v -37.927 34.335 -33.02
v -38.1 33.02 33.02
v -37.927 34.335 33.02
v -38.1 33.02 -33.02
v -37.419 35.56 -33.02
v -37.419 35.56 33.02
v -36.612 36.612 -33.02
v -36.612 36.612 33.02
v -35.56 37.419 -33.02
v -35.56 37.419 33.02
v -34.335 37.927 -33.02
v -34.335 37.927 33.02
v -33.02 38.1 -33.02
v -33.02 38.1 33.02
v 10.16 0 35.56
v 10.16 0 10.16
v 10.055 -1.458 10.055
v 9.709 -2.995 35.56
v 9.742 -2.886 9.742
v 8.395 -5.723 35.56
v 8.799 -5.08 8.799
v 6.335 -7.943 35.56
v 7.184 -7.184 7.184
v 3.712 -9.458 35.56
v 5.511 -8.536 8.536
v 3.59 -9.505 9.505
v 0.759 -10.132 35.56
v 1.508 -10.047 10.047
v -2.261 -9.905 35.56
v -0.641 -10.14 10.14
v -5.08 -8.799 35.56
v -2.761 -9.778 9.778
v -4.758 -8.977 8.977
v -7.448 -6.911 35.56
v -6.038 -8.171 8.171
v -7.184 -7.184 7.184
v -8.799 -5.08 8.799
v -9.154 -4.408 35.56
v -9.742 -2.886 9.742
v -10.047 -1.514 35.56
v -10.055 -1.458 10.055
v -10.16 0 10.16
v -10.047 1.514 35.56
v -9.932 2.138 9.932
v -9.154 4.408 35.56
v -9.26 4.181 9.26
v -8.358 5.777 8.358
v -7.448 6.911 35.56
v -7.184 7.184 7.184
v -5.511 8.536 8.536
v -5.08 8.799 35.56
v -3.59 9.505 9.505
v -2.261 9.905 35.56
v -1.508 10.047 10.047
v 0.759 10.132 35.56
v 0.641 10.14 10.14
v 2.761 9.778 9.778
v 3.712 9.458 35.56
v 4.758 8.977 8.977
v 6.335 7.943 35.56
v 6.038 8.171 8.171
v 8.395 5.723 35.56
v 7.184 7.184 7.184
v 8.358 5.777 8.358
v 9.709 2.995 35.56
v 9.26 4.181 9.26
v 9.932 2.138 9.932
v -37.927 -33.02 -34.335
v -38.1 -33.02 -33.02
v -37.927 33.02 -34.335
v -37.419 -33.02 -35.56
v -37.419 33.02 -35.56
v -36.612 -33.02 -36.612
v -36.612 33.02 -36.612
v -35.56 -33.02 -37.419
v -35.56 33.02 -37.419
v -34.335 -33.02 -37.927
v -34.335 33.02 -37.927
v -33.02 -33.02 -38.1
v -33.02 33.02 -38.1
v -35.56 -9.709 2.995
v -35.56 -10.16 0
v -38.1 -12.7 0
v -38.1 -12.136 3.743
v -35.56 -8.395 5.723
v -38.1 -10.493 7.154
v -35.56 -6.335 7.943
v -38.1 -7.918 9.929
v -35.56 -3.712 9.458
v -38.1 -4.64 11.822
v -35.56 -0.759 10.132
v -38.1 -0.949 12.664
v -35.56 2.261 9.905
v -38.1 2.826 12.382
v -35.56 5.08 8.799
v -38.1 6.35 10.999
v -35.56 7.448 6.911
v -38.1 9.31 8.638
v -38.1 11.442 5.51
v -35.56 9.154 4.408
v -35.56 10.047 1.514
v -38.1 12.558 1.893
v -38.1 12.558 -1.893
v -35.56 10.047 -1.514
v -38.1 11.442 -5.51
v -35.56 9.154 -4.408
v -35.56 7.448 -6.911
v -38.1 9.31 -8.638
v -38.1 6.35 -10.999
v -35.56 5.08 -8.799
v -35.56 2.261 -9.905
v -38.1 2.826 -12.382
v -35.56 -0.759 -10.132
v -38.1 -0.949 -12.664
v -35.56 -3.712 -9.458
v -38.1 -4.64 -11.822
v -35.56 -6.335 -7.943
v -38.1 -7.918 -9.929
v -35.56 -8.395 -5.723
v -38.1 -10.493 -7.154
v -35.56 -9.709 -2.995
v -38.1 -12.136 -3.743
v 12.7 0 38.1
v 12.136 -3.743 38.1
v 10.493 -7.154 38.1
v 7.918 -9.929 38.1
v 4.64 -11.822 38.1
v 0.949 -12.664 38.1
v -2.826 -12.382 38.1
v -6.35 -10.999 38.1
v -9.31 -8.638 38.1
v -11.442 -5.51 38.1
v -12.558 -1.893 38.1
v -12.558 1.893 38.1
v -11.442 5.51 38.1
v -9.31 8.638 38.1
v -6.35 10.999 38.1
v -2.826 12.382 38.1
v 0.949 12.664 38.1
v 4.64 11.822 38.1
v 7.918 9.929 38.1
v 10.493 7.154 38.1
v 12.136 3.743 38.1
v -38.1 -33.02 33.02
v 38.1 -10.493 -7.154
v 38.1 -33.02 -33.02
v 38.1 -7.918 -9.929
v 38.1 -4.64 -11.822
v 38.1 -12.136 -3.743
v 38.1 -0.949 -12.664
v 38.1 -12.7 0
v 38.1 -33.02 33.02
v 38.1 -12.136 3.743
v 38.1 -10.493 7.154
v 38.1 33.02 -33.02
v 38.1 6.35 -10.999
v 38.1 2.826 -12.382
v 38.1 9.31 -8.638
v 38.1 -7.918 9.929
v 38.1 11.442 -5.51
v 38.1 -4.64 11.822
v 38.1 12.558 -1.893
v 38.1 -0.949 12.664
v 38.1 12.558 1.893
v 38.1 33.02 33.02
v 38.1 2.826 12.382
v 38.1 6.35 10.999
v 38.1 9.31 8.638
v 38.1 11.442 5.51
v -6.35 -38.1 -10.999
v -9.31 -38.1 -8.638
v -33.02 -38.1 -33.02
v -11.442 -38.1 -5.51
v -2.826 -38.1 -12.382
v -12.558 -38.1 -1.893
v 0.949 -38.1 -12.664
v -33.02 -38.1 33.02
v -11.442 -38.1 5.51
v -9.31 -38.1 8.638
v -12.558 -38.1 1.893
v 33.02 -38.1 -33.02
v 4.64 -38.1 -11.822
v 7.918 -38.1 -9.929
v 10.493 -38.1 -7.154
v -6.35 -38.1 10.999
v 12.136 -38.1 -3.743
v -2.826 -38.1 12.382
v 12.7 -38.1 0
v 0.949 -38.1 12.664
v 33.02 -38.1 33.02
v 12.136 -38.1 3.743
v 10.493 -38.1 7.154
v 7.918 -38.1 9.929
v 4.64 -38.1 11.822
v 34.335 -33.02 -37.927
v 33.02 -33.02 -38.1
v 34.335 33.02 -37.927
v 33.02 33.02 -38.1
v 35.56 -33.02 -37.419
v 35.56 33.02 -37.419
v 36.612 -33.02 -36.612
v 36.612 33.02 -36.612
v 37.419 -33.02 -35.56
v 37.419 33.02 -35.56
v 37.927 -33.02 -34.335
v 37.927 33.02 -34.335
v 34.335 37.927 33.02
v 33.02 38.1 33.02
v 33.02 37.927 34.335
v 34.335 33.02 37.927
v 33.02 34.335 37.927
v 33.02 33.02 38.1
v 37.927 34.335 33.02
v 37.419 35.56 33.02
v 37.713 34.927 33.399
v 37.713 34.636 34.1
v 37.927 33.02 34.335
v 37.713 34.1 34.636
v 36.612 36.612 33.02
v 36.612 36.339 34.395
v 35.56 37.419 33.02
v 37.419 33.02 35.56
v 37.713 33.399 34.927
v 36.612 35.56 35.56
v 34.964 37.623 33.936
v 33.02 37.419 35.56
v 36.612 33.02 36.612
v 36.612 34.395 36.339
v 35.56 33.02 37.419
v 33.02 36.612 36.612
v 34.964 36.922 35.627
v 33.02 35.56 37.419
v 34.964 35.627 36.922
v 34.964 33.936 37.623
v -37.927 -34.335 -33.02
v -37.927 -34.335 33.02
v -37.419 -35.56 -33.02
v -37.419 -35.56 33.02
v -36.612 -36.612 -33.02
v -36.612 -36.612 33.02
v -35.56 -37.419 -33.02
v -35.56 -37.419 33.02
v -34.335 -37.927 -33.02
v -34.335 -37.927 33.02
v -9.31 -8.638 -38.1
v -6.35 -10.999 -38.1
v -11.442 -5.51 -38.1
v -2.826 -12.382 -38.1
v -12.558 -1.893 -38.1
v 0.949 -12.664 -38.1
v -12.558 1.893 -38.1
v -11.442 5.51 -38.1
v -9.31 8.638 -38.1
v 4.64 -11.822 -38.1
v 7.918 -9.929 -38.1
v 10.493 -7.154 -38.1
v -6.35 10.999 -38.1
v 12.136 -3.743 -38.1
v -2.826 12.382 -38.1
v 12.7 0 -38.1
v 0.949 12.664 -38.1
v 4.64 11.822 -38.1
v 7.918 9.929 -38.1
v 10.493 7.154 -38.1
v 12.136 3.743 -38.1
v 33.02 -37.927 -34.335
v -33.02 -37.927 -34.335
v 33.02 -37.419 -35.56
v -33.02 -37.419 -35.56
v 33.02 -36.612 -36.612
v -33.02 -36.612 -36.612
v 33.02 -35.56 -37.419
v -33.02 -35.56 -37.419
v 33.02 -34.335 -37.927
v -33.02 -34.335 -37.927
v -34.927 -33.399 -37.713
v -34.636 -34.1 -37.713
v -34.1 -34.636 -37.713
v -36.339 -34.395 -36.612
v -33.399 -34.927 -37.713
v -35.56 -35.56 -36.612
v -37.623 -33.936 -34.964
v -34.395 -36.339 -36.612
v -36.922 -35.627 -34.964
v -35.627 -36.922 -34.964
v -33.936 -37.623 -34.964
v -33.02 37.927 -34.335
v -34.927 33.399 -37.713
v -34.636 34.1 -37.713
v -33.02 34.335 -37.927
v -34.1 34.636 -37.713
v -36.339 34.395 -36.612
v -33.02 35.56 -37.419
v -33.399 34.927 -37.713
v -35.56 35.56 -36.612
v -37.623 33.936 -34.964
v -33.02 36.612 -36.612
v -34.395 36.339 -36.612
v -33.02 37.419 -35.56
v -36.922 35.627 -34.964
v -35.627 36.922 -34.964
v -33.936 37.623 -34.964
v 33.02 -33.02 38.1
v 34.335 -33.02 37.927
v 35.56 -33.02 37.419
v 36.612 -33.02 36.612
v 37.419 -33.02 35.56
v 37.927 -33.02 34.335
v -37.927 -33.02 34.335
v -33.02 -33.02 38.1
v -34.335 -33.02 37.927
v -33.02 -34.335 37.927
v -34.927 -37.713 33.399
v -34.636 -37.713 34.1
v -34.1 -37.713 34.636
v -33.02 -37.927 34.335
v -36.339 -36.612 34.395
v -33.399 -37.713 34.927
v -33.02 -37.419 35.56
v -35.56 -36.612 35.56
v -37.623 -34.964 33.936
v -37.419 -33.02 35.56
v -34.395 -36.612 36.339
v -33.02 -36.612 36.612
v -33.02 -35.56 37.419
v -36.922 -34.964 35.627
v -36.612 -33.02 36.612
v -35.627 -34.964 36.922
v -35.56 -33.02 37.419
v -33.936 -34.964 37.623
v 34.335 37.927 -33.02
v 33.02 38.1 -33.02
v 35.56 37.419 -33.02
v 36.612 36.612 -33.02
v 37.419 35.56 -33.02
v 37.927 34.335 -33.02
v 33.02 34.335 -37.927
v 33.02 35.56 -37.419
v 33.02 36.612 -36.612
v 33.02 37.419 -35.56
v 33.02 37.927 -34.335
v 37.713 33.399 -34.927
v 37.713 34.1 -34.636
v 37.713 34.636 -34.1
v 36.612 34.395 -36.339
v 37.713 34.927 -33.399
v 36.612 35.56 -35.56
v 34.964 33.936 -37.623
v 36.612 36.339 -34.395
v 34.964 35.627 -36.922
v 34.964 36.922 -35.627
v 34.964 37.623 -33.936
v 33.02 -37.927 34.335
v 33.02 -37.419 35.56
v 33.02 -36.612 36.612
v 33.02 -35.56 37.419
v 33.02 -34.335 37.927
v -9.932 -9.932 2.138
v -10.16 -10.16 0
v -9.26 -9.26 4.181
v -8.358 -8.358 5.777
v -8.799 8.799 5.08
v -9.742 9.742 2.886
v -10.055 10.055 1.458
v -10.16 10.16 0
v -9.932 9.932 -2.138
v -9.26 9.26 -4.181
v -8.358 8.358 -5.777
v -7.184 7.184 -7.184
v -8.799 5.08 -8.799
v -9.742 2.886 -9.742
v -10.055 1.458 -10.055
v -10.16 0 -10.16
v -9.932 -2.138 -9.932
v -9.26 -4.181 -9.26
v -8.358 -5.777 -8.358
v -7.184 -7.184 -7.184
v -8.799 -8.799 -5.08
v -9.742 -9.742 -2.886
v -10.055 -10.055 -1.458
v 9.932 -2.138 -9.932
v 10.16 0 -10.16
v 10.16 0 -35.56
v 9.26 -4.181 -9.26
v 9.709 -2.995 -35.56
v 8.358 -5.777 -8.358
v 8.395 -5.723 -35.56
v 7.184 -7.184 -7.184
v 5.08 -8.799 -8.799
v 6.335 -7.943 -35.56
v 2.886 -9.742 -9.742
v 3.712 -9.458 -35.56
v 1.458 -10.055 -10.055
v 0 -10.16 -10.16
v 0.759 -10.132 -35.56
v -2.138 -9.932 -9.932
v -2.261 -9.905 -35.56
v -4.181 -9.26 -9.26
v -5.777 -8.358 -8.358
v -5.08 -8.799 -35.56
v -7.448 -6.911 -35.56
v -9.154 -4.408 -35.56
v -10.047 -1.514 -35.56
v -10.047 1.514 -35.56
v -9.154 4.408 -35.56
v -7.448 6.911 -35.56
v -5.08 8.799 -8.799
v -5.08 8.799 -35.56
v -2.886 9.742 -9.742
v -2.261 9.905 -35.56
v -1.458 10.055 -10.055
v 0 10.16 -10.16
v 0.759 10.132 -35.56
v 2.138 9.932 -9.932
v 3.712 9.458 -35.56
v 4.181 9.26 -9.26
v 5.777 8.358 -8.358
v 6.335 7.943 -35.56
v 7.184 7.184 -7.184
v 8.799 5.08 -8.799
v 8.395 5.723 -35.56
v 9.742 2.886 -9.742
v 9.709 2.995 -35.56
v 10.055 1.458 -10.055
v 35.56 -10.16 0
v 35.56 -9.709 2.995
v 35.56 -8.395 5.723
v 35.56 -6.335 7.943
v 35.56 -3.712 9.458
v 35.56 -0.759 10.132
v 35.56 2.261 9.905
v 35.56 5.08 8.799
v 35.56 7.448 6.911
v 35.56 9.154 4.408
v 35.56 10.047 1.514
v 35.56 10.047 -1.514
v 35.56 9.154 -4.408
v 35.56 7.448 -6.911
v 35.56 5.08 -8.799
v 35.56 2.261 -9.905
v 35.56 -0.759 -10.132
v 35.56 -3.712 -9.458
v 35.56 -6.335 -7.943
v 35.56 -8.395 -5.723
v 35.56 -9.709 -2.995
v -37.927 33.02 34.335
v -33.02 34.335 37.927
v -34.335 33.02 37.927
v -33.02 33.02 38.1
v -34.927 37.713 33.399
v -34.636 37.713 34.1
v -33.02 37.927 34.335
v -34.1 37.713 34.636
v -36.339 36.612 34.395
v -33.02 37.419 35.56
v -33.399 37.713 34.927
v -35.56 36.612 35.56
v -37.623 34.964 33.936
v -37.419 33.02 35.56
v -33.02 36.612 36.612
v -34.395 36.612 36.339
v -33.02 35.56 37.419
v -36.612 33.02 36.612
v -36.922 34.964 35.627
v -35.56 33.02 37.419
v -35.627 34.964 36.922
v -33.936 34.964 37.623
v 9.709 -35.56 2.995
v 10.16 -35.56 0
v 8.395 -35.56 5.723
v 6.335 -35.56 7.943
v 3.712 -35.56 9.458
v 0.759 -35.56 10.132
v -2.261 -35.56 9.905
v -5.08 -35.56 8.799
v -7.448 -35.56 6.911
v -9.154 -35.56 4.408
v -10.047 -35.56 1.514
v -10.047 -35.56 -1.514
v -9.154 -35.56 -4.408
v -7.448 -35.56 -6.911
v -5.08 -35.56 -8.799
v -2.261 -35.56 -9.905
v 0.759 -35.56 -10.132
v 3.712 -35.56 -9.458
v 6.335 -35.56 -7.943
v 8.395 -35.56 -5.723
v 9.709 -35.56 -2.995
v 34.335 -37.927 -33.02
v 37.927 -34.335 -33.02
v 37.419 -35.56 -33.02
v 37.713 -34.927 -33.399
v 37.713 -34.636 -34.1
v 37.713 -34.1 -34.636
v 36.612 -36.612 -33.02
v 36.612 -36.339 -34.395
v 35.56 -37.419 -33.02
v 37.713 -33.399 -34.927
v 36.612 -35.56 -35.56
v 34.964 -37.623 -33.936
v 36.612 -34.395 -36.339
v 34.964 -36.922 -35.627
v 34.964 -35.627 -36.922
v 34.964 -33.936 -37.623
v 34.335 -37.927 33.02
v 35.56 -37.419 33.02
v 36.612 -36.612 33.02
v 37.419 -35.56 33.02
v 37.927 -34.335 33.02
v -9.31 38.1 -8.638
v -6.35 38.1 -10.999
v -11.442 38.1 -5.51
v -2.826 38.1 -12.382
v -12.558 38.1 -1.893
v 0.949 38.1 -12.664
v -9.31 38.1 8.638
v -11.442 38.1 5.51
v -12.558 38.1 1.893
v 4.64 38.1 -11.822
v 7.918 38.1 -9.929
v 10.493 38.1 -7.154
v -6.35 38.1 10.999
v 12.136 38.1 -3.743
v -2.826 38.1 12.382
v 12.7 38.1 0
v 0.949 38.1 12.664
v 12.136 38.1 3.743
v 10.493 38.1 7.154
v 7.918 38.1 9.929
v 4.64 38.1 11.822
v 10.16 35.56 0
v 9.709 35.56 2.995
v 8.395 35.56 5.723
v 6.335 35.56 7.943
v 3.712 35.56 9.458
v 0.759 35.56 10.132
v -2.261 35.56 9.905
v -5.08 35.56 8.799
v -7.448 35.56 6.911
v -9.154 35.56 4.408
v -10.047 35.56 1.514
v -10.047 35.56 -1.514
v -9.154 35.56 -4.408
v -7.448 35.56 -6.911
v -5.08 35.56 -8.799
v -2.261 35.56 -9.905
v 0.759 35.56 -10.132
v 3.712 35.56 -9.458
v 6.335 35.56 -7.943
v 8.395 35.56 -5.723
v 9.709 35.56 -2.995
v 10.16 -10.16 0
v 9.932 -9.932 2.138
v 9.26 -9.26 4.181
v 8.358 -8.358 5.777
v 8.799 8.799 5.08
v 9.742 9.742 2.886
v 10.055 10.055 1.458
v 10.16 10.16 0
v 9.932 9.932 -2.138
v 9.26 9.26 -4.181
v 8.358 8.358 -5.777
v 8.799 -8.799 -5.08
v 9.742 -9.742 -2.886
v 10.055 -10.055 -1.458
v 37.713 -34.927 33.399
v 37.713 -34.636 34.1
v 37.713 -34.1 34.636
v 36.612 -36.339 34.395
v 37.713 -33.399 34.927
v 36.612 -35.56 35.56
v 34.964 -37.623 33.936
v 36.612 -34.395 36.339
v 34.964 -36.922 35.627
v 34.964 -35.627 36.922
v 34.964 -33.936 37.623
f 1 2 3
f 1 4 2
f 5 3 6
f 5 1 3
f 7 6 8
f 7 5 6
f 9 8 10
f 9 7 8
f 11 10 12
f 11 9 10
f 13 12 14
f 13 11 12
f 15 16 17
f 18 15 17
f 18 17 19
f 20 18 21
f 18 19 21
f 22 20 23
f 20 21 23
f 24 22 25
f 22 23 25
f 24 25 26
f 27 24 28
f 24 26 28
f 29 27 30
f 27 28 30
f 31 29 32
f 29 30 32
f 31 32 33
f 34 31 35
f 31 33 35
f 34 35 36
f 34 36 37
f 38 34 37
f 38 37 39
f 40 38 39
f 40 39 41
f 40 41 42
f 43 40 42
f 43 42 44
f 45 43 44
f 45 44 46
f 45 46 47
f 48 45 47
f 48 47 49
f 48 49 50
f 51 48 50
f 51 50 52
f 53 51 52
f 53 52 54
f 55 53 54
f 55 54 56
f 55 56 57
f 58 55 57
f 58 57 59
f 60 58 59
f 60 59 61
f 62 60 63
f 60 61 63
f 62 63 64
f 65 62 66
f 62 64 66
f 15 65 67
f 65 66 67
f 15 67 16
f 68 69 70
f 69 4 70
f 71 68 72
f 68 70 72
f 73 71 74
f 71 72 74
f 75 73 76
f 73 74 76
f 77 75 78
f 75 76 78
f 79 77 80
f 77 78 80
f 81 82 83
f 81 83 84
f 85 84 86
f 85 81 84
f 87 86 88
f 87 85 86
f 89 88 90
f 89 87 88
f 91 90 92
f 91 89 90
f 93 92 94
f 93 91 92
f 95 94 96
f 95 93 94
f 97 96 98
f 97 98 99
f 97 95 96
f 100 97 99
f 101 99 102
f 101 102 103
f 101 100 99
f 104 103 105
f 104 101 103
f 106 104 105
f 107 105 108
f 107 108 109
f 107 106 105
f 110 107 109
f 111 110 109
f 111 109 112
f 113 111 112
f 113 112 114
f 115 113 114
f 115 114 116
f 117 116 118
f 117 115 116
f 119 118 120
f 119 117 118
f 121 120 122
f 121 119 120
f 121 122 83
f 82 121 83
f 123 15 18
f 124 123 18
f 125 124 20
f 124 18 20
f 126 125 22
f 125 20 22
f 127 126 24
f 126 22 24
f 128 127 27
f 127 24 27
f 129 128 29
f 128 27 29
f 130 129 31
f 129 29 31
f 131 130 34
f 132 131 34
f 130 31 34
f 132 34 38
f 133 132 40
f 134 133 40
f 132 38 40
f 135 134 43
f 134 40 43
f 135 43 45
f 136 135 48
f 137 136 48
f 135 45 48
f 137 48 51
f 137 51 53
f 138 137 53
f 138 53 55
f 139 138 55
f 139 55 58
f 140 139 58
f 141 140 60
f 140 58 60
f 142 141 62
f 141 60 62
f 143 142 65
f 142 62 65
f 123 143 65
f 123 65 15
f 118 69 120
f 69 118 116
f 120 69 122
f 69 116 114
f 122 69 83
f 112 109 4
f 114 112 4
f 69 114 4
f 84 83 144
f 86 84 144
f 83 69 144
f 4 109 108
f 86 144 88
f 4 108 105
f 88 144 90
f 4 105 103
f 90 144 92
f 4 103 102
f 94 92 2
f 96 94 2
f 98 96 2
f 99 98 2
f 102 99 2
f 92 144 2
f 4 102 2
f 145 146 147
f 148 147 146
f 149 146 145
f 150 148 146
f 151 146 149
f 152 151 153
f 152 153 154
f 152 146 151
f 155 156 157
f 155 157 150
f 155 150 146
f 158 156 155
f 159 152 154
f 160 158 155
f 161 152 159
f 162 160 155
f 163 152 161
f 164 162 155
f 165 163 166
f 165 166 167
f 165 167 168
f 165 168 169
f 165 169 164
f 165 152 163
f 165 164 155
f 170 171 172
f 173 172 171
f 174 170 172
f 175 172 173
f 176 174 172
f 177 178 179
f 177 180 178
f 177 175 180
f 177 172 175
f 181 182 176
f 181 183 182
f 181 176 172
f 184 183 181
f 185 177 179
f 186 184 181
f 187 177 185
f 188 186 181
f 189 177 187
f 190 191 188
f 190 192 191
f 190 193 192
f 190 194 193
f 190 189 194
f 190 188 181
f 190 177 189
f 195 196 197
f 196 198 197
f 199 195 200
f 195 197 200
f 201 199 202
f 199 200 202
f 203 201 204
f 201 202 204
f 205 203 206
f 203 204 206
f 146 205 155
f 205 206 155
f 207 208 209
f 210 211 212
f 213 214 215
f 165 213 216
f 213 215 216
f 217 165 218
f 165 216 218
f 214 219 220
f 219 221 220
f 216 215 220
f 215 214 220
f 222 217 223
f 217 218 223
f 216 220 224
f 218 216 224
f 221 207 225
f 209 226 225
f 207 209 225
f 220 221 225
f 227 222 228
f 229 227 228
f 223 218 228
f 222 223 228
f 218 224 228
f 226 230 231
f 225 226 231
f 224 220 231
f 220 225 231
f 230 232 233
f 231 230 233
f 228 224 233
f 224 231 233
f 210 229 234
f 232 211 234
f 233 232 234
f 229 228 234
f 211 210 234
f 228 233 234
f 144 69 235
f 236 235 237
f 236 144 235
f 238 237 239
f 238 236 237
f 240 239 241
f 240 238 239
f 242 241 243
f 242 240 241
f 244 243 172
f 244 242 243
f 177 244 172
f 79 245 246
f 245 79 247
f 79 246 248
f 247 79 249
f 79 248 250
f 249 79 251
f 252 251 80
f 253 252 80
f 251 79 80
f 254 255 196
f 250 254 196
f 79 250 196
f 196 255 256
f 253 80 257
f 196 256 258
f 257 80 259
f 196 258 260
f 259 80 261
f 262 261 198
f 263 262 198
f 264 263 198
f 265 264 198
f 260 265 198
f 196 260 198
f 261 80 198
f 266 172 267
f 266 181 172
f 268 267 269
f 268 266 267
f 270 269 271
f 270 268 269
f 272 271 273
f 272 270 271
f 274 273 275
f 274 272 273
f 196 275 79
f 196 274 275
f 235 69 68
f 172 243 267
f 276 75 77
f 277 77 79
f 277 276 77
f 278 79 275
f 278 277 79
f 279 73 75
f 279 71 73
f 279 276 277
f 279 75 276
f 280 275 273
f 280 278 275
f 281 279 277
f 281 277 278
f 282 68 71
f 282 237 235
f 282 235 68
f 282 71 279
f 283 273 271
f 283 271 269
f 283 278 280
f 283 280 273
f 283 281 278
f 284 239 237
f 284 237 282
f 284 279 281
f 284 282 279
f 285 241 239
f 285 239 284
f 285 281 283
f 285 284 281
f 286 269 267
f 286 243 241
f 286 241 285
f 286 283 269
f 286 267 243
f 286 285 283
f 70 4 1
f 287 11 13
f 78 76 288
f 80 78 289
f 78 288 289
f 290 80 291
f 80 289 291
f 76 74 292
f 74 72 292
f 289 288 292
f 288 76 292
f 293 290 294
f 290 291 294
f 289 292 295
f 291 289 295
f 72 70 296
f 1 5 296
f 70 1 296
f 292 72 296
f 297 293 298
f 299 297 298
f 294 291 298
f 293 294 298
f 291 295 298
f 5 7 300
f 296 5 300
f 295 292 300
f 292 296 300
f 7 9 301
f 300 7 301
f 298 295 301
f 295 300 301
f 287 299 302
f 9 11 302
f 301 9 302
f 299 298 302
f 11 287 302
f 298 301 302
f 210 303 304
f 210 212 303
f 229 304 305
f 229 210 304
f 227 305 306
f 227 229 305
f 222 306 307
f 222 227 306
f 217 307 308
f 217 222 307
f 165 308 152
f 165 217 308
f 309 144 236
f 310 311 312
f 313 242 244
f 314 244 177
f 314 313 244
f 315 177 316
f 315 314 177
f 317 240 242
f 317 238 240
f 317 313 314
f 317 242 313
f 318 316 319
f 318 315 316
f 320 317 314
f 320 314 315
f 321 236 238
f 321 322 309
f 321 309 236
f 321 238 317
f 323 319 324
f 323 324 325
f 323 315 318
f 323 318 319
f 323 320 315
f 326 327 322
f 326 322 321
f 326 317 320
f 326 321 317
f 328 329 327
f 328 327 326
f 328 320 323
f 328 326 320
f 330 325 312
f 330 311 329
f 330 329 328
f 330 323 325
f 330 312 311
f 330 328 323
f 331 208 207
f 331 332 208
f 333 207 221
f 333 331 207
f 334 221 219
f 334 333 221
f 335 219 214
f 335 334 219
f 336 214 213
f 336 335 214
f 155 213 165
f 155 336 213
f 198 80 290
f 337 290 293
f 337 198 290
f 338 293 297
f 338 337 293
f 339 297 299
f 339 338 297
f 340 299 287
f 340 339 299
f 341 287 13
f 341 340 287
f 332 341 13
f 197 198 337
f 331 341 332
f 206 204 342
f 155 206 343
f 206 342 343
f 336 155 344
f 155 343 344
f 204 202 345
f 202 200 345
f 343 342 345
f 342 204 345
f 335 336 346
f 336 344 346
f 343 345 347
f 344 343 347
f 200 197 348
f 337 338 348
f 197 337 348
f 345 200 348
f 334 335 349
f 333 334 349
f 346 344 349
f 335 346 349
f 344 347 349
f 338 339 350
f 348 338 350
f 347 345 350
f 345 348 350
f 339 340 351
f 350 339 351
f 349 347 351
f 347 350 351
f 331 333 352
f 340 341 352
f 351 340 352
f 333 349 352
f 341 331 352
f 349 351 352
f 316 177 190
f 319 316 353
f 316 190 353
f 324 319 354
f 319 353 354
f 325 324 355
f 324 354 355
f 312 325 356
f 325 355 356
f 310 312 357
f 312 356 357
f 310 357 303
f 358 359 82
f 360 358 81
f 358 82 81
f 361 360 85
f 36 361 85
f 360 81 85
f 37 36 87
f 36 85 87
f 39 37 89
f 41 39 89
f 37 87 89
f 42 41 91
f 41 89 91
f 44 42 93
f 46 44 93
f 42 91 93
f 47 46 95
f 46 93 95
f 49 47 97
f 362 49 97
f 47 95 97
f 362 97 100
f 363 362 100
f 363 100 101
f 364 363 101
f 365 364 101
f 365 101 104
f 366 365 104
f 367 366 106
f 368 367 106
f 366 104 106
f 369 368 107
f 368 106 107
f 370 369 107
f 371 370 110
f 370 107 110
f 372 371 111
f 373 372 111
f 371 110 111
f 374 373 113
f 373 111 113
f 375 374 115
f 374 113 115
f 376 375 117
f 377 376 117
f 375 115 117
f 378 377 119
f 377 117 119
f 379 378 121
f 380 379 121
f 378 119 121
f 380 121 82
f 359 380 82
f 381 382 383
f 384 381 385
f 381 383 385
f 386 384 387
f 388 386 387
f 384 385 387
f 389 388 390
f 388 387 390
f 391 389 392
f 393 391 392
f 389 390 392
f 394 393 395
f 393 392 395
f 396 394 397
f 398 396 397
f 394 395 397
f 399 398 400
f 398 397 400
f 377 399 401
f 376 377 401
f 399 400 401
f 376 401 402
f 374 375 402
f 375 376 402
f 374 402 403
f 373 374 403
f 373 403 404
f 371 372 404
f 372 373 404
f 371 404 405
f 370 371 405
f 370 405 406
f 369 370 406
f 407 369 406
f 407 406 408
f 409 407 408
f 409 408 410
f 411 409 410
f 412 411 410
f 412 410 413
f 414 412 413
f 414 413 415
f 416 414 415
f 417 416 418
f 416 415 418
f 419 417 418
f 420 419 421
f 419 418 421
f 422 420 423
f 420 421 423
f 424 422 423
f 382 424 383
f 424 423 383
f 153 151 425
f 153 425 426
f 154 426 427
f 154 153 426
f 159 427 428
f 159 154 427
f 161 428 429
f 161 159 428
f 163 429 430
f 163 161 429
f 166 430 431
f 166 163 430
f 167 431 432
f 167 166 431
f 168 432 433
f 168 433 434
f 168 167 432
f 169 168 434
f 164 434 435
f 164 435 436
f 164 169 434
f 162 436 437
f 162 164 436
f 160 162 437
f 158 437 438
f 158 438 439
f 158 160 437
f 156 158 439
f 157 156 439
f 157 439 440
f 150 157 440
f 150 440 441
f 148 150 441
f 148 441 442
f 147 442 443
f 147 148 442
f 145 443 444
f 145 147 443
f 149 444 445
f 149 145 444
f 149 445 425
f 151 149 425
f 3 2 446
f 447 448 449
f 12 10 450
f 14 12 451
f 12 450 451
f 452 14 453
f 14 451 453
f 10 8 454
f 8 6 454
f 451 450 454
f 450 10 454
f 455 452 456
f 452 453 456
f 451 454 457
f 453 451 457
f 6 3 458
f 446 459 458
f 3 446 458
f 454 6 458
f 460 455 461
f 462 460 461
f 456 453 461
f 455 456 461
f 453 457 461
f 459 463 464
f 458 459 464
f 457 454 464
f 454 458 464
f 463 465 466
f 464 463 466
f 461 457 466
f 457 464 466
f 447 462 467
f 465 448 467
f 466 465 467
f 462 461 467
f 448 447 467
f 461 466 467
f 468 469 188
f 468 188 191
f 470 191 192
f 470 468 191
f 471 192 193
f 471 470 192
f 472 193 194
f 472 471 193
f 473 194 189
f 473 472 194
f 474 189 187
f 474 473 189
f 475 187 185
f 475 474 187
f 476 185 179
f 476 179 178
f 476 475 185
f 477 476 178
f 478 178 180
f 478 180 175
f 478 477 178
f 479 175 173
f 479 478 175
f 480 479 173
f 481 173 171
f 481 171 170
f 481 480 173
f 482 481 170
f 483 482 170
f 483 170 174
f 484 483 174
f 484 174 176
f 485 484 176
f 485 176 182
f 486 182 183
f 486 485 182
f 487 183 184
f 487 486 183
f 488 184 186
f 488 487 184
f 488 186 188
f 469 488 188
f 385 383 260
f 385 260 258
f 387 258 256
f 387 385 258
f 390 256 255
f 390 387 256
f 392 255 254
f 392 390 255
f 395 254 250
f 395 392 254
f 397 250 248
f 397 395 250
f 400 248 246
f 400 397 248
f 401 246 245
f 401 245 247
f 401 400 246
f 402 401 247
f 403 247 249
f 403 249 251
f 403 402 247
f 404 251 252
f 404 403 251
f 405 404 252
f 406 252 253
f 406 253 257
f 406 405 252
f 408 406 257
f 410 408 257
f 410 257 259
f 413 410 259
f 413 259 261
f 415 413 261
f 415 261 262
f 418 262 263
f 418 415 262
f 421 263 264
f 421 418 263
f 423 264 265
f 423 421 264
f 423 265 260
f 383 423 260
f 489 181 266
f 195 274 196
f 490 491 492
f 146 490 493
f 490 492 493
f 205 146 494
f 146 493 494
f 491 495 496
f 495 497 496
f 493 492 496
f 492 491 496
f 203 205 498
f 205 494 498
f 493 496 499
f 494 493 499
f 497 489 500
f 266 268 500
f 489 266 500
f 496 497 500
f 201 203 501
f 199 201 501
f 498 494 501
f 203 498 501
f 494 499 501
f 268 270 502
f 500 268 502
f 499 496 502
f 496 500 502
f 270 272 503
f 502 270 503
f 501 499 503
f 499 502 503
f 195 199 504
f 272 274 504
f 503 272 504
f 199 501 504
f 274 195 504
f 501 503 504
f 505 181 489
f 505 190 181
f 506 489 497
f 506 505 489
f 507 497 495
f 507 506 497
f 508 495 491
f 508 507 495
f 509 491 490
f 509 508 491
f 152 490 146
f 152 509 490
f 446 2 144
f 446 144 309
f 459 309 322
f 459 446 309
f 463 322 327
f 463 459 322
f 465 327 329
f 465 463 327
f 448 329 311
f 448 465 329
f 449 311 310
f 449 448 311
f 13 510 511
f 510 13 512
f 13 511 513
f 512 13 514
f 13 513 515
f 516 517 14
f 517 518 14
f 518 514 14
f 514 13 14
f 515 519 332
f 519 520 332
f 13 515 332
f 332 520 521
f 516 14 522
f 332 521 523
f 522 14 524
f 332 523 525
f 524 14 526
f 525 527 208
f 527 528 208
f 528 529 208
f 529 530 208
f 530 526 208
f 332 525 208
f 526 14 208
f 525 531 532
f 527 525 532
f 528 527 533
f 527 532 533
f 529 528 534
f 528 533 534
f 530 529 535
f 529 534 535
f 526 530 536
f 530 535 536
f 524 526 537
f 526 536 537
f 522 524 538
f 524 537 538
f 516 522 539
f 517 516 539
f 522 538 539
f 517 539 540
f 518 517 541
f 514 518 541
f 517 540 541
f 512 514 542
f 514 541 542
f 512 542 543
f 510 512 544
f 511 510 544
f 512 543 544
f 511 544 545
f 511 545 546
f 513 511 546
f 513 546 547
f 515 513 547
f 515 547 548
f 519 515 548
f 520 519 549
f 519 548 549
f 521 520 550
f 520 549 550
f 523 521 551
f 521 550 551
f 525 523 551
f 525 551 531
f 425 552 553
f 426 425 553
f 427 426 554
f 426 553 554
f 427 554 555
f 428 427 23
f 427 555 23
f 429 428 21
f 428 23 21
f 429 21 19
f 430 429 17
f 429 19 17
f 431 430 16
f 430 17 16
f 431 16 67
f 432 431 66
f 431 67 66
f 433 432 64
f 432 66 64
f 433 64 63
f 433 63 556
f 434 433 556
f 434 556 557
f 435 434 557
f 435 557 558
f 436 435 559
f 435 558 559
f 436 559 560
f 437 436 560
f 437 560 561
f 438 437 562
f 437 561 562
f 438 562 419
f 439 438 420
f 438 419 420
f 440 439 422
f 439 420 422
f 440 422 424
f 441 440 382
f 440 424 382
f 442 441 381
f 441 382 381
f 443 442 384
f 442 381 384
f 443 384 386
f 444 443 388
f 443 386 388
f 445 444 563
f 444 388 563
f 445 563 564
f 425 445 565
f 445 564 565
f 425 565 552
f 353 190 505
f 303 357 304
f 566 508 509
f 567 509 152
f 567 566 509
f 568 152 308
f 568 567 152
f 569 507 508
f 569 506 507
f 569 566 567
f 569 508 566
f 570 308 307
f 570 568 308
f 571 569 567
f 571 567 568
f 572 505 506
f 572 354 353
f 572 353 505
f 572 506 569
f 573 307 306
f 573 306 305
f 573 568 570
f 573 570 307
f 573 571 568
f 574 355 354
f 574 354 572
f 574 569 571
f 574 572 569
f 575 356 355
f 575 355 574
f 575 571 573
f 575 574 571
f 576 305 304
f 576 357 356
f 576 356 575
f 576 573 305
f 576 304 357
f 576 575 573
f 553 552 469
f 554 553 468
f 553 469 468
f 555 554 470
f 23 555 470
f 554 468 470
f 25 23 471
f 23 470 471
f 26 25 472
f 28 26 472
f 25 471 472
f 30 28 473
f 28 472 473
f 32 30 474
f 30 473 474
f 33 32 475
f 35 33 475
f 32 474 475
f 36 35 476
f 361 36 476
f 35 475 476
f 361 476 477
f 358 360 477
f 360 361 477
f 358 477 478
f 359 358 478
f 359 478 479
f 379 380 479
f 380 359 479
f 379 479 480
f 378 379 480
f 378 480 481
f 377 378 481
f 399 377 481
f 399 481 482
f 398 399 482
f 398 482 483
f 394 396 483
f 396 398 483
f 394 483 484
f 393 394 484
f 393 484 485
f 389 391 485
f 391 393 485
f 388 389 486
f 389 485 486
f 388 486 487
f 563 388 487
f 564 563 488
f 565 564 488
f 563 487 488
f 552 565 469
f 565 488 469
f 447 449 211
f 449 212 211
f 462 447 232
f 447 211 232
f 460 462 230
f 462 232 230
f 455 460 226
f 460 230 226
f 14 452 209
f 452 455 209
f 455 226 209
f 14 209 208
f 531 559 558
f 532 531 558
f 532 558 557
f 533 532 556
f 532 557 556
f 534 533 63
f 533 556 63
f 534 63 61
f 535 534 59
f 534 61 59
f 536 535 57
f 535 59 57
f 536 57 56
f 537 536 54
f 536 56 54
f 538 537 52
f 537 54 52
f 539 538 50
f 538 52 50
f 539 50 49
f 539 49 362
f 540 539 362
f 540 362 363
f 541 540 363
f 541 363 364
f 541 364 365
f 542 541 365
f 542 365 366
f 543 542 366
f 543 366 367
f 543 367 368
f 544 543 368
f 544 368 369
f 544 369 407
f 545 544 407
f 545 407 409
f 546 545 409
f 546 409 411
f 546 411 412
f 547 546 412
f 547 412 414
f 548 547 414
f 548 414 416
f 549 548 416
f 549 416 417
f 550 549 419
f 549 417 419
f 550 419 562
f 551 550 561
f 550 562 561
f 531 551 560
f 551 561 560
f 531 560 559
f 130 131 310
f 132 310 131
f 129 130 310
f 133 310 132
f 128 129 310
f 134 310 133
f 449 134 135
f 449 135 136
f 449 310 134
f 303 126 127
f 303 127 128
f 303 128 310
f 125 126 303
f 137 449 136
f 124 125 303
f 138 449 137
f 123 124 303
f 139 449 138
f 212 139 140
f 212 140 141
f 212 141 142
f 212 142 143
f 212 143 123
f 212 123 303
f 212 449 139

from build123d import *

# Parameters (mm, degrees)
F0_W     = 76.2
F0_H     = 76.2
F1_DEPTH = 38.1
F2_R     = 10.16
F3_DEPTH = 147.32
F4_R     = 10.16
F5_DEPTH = 163.322
F6_R     = 10.16
F7_DEPTH = 99.06
F8_R     = 5.08
F9_SIZE  = 2.54


with BuildPart() as f1:
    # F0 (on Top) → F1 (new body, symmetric)
    with BuildSketch(Plane.XY):
        Rectangle(F0_W, F0_H)
    extrude(amount=F1_DEPTH, both=True)

    # F2 (on face) → F3 (cut, symmetric)
    with BuildSketch(Plane(origin=(-38.1, 0, 0), x_dir=(0, -1, 0), z_dir=(-1, 0, 0))):
        Circle(F2_R)
    extrude(amount=F3_DEPTH, both=True, mode=Mode.SUBTRACT)

    # F4 (on face) → F5 (cut)
    with BuildSketch(Plane(origin=(0, 0, -38.1), x_dir=(1, 0, 0), z_dir=(0, 0, -1))):
        Circle(F4_R)
    extrude(amount=-F5_DEPTH, mode=Mode.SUBTRACT)

    # F6 (on face) → F7 (cut)
    with BuildSketch(Plane.XZ.offset(38.1)):
        Circle(F6_R)
    extrude(amount=-F7_DEPTH, mode=Mode.SUBTRACT)

    # F8
    f8_edges = [f1.edges().sort_by_distance(p)[0] for p in [
        (-38.1, 0, 38.1),
        (-38.1, -38.1, 0),
        (-38.1, 38.1, 0),
        (-38.1, 0, -38.1),
        (0, 38.1, -38.1),
        (0, -38.1, -38.1),
        (0, 38.1, 38.1),
        (0, -38.1, 38.1),
        (38.1, -38.1, 0),
        (38.1, 0, -38.1),
        (38.1, 38.1, 0),
        (38.1, 0, 38.1),
    ]]
    fillet(f8_edges, radius=F8_R)

    # F9
    f9_edges = [f1.edges().sort_by_distance(p)[0] for p in [
        (-10.16, 0, -38.1),
        (38.1, 10.16, 0),
        (-10.16, -38.1, 0),
        (-10.16, 38.1, 0),
        (-10.16, 0, 38.1),
        (-38.1, 10.16, 0),
    ]]
    chamfer(f9_edges, length=F9_SIZE)


solid = f1.part
